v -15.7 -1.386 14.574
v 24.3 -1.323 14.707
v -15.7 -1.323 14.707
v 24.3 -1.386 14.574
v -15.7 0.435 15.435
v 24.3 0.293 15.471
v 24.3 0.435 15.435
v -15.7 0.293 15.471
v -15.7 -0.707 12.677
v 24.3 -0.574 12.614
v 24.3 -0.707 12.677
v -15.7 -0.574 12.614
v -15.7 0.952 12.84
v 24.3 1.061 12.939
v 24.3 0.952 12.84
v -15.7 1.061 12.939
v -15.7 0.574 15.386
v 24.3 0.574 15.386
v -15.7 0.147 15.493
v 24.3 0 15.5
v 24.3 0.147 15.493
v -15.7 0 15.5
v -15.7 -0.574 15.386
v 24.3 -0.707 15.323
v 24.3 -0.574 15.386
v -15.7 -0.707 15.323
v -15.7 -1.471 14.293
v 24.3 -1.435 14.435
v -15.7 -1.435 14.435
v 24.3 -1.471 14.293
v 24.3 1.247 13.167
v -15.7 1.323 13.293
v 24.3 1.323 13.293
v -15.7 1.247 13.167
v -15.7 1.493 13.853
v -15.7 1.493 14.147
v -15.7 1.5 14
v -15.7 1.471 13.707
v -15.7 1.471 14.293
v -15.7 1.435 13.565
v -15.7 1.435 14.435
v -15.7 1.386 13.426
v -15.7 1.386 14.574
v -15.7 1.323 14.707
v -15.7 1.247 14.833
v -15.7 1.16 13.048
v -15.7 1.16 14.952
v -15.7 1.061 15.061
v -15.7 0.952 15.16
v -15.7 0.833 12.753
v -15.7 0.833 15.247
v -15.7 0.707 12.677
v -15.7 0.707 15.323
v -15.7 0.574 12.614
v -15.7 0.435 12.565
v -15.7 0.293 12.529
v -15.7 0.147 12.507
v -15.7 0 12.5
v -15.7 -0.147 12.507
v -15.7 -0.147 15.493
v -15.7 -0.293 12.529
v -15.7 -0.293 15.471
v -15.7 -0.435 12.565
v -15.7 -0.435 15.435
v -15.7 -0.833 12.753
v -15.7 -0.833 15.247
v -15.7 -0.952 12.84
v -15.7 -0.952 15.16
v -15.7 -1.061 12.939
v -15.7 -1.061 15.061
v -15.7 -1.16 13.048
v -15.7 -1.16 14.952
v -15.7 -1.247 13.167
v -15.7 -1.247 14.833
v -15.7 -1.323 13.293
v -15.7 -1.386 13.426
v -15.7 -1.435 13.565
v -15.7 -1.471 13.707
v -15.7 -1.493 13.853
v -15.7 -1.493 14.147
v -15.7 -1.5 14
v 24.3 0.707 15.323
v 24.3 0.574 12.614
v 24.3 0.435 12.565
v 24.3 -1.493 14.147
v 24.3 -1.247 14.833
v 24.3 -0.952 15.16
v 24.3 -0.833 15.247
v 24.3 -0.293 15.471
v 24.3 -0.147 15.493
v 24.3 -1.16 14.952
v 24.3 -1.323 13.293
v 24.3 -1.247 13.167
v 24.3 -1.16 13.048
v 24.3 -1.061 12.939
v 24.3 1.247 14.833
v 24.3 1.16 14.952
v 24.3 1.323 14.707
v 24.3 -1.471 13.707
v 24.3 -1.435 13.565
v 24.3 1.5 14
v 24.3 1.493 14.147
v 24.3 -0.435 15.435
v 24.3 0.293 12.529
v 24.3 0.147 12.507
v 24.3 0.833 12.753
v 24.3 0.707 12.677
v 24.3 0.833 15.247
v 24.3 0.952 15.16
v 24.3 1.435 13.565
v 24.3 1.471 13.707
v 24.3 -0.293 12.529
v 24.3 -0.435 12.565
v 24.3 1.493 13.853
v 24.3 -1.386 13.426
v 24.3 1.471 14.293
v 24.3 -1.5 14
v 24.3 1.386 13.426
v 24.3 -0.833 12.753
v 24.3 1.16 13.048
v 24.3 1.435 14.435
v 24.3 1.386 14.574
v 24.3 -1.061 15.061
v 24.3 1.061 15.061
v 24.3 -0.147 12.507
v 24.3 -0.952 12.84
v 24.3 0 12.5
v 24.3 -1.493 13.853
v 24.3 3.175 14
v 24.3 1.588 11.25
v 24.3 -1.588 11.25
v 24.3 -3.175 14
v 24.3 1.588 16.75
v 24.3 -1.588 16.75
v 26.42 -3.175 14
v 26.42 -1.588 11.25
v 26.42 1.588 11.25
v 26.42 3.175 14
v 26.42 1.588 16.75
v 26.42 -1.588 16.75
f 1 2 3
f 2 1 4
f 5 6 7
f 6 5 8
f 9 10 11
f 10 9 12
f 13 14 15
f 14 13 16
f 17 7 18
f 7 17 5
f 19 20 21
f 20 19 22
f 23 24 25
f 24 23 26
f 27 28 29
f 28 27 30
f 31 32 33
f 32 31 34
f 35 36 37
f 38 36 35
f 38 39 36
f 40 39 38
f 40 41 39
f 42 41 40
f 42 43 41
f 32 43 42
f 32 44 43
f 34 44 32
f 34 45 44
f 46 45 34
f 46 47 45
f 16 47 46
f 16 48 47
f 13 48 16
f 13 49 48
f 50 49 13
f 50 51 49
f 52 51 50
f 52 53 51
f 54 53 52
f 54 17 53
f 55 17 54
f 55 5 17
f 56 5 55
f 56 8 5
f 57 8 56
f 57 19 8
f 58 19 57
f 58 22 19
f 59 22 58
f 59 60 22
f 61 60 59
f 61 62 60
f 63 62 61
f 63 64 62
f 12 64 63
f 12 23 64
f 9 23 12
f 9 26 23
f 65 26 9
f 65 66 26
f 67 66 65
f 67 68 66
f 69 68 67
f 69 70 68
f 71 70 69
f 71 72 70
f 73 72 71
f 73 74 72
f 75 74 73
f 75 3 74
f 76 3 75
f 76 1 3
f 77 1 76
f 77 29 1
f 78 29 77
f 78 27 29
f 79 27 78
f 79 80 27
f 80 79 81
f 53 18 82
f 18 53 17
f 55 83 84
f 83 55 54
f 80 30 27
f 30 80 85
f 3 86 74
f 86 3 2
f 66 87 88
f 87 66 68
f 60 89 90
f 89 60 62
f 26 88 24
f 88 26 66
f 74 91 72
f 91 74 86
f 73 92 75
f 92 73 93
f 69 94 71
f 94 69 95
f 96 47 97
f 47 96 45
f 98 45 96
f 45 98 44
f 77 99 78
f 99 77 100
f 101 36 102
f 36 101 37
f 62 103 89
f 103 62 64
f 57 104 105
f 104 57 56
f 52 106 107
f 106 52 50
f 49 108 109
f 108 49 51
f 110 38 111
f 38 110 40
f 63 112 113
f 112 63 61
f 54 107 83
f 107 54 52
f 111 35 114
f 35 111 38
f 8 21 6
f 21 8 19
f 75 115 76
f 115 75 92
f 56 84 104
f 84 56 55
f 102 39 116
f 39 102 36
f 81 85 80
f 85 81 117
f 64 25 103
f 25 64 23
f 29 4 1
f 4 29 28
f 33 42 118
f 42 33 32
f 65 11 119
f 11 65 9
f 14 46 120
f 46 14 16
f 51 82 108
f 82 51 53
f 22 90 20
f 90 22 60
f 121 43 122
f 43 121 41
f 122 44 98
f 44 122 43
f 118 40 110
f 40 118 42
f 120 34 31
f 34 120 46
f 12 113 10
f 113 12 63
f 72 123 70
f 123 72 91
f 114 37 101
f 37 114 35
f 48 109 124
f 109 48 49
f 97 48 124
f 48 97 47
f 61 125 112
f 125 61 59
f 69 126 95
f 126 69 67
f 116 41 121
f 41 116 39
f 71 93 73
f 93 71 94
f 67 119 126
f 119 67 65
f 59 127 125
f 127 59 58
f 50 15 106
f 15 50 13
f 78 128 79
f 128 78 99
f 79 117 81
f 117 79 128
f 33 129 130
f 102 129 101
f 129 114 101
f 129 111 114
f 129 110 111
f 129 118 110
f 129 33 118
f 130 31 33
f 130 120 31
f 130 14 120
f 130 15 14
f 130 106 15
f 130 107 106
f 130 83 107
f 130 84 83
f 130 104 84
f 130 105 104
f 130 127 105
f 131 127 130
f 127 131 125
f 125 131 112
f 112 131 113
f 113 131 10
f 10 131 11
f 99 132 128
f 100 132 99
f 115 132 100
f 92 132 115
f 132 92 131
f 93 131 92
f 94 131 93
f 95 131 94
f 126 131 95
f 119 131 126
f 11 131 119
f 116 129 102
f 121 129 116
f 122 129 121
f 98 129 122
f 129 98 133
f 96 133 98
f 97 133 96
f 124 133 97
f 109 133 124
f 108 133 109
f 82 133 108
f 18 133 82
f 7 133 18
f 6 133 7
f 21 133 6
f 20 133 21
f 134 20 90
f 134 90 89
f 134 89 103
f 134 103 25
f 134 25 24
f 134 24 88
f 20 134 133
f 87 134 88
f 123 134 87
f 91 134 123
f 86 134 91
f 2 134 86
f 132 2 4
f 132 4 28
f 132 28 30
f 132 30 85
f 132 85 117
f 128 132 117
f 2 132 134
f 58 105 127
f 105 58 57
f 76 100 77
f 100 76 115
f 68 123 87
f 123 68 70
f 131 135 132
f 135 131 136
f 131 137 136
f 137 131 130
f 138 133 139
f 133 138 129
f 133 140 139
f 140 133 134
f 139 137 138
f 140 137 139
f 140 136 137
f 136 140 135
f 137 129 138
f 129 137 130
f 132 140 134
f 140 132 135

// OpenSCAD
// Non-print ideal hardware proxies, directly using the canonical C-twist.
use <../../../jigs/quick_release_prototypes/quick_release_prototypes.scad>
part="lock_bolt"; // [lock_bolt,lock_nut,lock_washer,rubber_pads]
if(part=="lock_bolt") through_bolt("twist",include_washer=false);
else if(part=="lock_nut") fixed_nut("twist");
else if(part=="lock_washer") difference() {
    through_bolt("twist",include_washer=true);
    through_bolt("twist",include_washer=false);
}
else if(part=="rubber_pads") twist_pad_reference(compressed=true);
else assert(false,"Unknown hardware");
